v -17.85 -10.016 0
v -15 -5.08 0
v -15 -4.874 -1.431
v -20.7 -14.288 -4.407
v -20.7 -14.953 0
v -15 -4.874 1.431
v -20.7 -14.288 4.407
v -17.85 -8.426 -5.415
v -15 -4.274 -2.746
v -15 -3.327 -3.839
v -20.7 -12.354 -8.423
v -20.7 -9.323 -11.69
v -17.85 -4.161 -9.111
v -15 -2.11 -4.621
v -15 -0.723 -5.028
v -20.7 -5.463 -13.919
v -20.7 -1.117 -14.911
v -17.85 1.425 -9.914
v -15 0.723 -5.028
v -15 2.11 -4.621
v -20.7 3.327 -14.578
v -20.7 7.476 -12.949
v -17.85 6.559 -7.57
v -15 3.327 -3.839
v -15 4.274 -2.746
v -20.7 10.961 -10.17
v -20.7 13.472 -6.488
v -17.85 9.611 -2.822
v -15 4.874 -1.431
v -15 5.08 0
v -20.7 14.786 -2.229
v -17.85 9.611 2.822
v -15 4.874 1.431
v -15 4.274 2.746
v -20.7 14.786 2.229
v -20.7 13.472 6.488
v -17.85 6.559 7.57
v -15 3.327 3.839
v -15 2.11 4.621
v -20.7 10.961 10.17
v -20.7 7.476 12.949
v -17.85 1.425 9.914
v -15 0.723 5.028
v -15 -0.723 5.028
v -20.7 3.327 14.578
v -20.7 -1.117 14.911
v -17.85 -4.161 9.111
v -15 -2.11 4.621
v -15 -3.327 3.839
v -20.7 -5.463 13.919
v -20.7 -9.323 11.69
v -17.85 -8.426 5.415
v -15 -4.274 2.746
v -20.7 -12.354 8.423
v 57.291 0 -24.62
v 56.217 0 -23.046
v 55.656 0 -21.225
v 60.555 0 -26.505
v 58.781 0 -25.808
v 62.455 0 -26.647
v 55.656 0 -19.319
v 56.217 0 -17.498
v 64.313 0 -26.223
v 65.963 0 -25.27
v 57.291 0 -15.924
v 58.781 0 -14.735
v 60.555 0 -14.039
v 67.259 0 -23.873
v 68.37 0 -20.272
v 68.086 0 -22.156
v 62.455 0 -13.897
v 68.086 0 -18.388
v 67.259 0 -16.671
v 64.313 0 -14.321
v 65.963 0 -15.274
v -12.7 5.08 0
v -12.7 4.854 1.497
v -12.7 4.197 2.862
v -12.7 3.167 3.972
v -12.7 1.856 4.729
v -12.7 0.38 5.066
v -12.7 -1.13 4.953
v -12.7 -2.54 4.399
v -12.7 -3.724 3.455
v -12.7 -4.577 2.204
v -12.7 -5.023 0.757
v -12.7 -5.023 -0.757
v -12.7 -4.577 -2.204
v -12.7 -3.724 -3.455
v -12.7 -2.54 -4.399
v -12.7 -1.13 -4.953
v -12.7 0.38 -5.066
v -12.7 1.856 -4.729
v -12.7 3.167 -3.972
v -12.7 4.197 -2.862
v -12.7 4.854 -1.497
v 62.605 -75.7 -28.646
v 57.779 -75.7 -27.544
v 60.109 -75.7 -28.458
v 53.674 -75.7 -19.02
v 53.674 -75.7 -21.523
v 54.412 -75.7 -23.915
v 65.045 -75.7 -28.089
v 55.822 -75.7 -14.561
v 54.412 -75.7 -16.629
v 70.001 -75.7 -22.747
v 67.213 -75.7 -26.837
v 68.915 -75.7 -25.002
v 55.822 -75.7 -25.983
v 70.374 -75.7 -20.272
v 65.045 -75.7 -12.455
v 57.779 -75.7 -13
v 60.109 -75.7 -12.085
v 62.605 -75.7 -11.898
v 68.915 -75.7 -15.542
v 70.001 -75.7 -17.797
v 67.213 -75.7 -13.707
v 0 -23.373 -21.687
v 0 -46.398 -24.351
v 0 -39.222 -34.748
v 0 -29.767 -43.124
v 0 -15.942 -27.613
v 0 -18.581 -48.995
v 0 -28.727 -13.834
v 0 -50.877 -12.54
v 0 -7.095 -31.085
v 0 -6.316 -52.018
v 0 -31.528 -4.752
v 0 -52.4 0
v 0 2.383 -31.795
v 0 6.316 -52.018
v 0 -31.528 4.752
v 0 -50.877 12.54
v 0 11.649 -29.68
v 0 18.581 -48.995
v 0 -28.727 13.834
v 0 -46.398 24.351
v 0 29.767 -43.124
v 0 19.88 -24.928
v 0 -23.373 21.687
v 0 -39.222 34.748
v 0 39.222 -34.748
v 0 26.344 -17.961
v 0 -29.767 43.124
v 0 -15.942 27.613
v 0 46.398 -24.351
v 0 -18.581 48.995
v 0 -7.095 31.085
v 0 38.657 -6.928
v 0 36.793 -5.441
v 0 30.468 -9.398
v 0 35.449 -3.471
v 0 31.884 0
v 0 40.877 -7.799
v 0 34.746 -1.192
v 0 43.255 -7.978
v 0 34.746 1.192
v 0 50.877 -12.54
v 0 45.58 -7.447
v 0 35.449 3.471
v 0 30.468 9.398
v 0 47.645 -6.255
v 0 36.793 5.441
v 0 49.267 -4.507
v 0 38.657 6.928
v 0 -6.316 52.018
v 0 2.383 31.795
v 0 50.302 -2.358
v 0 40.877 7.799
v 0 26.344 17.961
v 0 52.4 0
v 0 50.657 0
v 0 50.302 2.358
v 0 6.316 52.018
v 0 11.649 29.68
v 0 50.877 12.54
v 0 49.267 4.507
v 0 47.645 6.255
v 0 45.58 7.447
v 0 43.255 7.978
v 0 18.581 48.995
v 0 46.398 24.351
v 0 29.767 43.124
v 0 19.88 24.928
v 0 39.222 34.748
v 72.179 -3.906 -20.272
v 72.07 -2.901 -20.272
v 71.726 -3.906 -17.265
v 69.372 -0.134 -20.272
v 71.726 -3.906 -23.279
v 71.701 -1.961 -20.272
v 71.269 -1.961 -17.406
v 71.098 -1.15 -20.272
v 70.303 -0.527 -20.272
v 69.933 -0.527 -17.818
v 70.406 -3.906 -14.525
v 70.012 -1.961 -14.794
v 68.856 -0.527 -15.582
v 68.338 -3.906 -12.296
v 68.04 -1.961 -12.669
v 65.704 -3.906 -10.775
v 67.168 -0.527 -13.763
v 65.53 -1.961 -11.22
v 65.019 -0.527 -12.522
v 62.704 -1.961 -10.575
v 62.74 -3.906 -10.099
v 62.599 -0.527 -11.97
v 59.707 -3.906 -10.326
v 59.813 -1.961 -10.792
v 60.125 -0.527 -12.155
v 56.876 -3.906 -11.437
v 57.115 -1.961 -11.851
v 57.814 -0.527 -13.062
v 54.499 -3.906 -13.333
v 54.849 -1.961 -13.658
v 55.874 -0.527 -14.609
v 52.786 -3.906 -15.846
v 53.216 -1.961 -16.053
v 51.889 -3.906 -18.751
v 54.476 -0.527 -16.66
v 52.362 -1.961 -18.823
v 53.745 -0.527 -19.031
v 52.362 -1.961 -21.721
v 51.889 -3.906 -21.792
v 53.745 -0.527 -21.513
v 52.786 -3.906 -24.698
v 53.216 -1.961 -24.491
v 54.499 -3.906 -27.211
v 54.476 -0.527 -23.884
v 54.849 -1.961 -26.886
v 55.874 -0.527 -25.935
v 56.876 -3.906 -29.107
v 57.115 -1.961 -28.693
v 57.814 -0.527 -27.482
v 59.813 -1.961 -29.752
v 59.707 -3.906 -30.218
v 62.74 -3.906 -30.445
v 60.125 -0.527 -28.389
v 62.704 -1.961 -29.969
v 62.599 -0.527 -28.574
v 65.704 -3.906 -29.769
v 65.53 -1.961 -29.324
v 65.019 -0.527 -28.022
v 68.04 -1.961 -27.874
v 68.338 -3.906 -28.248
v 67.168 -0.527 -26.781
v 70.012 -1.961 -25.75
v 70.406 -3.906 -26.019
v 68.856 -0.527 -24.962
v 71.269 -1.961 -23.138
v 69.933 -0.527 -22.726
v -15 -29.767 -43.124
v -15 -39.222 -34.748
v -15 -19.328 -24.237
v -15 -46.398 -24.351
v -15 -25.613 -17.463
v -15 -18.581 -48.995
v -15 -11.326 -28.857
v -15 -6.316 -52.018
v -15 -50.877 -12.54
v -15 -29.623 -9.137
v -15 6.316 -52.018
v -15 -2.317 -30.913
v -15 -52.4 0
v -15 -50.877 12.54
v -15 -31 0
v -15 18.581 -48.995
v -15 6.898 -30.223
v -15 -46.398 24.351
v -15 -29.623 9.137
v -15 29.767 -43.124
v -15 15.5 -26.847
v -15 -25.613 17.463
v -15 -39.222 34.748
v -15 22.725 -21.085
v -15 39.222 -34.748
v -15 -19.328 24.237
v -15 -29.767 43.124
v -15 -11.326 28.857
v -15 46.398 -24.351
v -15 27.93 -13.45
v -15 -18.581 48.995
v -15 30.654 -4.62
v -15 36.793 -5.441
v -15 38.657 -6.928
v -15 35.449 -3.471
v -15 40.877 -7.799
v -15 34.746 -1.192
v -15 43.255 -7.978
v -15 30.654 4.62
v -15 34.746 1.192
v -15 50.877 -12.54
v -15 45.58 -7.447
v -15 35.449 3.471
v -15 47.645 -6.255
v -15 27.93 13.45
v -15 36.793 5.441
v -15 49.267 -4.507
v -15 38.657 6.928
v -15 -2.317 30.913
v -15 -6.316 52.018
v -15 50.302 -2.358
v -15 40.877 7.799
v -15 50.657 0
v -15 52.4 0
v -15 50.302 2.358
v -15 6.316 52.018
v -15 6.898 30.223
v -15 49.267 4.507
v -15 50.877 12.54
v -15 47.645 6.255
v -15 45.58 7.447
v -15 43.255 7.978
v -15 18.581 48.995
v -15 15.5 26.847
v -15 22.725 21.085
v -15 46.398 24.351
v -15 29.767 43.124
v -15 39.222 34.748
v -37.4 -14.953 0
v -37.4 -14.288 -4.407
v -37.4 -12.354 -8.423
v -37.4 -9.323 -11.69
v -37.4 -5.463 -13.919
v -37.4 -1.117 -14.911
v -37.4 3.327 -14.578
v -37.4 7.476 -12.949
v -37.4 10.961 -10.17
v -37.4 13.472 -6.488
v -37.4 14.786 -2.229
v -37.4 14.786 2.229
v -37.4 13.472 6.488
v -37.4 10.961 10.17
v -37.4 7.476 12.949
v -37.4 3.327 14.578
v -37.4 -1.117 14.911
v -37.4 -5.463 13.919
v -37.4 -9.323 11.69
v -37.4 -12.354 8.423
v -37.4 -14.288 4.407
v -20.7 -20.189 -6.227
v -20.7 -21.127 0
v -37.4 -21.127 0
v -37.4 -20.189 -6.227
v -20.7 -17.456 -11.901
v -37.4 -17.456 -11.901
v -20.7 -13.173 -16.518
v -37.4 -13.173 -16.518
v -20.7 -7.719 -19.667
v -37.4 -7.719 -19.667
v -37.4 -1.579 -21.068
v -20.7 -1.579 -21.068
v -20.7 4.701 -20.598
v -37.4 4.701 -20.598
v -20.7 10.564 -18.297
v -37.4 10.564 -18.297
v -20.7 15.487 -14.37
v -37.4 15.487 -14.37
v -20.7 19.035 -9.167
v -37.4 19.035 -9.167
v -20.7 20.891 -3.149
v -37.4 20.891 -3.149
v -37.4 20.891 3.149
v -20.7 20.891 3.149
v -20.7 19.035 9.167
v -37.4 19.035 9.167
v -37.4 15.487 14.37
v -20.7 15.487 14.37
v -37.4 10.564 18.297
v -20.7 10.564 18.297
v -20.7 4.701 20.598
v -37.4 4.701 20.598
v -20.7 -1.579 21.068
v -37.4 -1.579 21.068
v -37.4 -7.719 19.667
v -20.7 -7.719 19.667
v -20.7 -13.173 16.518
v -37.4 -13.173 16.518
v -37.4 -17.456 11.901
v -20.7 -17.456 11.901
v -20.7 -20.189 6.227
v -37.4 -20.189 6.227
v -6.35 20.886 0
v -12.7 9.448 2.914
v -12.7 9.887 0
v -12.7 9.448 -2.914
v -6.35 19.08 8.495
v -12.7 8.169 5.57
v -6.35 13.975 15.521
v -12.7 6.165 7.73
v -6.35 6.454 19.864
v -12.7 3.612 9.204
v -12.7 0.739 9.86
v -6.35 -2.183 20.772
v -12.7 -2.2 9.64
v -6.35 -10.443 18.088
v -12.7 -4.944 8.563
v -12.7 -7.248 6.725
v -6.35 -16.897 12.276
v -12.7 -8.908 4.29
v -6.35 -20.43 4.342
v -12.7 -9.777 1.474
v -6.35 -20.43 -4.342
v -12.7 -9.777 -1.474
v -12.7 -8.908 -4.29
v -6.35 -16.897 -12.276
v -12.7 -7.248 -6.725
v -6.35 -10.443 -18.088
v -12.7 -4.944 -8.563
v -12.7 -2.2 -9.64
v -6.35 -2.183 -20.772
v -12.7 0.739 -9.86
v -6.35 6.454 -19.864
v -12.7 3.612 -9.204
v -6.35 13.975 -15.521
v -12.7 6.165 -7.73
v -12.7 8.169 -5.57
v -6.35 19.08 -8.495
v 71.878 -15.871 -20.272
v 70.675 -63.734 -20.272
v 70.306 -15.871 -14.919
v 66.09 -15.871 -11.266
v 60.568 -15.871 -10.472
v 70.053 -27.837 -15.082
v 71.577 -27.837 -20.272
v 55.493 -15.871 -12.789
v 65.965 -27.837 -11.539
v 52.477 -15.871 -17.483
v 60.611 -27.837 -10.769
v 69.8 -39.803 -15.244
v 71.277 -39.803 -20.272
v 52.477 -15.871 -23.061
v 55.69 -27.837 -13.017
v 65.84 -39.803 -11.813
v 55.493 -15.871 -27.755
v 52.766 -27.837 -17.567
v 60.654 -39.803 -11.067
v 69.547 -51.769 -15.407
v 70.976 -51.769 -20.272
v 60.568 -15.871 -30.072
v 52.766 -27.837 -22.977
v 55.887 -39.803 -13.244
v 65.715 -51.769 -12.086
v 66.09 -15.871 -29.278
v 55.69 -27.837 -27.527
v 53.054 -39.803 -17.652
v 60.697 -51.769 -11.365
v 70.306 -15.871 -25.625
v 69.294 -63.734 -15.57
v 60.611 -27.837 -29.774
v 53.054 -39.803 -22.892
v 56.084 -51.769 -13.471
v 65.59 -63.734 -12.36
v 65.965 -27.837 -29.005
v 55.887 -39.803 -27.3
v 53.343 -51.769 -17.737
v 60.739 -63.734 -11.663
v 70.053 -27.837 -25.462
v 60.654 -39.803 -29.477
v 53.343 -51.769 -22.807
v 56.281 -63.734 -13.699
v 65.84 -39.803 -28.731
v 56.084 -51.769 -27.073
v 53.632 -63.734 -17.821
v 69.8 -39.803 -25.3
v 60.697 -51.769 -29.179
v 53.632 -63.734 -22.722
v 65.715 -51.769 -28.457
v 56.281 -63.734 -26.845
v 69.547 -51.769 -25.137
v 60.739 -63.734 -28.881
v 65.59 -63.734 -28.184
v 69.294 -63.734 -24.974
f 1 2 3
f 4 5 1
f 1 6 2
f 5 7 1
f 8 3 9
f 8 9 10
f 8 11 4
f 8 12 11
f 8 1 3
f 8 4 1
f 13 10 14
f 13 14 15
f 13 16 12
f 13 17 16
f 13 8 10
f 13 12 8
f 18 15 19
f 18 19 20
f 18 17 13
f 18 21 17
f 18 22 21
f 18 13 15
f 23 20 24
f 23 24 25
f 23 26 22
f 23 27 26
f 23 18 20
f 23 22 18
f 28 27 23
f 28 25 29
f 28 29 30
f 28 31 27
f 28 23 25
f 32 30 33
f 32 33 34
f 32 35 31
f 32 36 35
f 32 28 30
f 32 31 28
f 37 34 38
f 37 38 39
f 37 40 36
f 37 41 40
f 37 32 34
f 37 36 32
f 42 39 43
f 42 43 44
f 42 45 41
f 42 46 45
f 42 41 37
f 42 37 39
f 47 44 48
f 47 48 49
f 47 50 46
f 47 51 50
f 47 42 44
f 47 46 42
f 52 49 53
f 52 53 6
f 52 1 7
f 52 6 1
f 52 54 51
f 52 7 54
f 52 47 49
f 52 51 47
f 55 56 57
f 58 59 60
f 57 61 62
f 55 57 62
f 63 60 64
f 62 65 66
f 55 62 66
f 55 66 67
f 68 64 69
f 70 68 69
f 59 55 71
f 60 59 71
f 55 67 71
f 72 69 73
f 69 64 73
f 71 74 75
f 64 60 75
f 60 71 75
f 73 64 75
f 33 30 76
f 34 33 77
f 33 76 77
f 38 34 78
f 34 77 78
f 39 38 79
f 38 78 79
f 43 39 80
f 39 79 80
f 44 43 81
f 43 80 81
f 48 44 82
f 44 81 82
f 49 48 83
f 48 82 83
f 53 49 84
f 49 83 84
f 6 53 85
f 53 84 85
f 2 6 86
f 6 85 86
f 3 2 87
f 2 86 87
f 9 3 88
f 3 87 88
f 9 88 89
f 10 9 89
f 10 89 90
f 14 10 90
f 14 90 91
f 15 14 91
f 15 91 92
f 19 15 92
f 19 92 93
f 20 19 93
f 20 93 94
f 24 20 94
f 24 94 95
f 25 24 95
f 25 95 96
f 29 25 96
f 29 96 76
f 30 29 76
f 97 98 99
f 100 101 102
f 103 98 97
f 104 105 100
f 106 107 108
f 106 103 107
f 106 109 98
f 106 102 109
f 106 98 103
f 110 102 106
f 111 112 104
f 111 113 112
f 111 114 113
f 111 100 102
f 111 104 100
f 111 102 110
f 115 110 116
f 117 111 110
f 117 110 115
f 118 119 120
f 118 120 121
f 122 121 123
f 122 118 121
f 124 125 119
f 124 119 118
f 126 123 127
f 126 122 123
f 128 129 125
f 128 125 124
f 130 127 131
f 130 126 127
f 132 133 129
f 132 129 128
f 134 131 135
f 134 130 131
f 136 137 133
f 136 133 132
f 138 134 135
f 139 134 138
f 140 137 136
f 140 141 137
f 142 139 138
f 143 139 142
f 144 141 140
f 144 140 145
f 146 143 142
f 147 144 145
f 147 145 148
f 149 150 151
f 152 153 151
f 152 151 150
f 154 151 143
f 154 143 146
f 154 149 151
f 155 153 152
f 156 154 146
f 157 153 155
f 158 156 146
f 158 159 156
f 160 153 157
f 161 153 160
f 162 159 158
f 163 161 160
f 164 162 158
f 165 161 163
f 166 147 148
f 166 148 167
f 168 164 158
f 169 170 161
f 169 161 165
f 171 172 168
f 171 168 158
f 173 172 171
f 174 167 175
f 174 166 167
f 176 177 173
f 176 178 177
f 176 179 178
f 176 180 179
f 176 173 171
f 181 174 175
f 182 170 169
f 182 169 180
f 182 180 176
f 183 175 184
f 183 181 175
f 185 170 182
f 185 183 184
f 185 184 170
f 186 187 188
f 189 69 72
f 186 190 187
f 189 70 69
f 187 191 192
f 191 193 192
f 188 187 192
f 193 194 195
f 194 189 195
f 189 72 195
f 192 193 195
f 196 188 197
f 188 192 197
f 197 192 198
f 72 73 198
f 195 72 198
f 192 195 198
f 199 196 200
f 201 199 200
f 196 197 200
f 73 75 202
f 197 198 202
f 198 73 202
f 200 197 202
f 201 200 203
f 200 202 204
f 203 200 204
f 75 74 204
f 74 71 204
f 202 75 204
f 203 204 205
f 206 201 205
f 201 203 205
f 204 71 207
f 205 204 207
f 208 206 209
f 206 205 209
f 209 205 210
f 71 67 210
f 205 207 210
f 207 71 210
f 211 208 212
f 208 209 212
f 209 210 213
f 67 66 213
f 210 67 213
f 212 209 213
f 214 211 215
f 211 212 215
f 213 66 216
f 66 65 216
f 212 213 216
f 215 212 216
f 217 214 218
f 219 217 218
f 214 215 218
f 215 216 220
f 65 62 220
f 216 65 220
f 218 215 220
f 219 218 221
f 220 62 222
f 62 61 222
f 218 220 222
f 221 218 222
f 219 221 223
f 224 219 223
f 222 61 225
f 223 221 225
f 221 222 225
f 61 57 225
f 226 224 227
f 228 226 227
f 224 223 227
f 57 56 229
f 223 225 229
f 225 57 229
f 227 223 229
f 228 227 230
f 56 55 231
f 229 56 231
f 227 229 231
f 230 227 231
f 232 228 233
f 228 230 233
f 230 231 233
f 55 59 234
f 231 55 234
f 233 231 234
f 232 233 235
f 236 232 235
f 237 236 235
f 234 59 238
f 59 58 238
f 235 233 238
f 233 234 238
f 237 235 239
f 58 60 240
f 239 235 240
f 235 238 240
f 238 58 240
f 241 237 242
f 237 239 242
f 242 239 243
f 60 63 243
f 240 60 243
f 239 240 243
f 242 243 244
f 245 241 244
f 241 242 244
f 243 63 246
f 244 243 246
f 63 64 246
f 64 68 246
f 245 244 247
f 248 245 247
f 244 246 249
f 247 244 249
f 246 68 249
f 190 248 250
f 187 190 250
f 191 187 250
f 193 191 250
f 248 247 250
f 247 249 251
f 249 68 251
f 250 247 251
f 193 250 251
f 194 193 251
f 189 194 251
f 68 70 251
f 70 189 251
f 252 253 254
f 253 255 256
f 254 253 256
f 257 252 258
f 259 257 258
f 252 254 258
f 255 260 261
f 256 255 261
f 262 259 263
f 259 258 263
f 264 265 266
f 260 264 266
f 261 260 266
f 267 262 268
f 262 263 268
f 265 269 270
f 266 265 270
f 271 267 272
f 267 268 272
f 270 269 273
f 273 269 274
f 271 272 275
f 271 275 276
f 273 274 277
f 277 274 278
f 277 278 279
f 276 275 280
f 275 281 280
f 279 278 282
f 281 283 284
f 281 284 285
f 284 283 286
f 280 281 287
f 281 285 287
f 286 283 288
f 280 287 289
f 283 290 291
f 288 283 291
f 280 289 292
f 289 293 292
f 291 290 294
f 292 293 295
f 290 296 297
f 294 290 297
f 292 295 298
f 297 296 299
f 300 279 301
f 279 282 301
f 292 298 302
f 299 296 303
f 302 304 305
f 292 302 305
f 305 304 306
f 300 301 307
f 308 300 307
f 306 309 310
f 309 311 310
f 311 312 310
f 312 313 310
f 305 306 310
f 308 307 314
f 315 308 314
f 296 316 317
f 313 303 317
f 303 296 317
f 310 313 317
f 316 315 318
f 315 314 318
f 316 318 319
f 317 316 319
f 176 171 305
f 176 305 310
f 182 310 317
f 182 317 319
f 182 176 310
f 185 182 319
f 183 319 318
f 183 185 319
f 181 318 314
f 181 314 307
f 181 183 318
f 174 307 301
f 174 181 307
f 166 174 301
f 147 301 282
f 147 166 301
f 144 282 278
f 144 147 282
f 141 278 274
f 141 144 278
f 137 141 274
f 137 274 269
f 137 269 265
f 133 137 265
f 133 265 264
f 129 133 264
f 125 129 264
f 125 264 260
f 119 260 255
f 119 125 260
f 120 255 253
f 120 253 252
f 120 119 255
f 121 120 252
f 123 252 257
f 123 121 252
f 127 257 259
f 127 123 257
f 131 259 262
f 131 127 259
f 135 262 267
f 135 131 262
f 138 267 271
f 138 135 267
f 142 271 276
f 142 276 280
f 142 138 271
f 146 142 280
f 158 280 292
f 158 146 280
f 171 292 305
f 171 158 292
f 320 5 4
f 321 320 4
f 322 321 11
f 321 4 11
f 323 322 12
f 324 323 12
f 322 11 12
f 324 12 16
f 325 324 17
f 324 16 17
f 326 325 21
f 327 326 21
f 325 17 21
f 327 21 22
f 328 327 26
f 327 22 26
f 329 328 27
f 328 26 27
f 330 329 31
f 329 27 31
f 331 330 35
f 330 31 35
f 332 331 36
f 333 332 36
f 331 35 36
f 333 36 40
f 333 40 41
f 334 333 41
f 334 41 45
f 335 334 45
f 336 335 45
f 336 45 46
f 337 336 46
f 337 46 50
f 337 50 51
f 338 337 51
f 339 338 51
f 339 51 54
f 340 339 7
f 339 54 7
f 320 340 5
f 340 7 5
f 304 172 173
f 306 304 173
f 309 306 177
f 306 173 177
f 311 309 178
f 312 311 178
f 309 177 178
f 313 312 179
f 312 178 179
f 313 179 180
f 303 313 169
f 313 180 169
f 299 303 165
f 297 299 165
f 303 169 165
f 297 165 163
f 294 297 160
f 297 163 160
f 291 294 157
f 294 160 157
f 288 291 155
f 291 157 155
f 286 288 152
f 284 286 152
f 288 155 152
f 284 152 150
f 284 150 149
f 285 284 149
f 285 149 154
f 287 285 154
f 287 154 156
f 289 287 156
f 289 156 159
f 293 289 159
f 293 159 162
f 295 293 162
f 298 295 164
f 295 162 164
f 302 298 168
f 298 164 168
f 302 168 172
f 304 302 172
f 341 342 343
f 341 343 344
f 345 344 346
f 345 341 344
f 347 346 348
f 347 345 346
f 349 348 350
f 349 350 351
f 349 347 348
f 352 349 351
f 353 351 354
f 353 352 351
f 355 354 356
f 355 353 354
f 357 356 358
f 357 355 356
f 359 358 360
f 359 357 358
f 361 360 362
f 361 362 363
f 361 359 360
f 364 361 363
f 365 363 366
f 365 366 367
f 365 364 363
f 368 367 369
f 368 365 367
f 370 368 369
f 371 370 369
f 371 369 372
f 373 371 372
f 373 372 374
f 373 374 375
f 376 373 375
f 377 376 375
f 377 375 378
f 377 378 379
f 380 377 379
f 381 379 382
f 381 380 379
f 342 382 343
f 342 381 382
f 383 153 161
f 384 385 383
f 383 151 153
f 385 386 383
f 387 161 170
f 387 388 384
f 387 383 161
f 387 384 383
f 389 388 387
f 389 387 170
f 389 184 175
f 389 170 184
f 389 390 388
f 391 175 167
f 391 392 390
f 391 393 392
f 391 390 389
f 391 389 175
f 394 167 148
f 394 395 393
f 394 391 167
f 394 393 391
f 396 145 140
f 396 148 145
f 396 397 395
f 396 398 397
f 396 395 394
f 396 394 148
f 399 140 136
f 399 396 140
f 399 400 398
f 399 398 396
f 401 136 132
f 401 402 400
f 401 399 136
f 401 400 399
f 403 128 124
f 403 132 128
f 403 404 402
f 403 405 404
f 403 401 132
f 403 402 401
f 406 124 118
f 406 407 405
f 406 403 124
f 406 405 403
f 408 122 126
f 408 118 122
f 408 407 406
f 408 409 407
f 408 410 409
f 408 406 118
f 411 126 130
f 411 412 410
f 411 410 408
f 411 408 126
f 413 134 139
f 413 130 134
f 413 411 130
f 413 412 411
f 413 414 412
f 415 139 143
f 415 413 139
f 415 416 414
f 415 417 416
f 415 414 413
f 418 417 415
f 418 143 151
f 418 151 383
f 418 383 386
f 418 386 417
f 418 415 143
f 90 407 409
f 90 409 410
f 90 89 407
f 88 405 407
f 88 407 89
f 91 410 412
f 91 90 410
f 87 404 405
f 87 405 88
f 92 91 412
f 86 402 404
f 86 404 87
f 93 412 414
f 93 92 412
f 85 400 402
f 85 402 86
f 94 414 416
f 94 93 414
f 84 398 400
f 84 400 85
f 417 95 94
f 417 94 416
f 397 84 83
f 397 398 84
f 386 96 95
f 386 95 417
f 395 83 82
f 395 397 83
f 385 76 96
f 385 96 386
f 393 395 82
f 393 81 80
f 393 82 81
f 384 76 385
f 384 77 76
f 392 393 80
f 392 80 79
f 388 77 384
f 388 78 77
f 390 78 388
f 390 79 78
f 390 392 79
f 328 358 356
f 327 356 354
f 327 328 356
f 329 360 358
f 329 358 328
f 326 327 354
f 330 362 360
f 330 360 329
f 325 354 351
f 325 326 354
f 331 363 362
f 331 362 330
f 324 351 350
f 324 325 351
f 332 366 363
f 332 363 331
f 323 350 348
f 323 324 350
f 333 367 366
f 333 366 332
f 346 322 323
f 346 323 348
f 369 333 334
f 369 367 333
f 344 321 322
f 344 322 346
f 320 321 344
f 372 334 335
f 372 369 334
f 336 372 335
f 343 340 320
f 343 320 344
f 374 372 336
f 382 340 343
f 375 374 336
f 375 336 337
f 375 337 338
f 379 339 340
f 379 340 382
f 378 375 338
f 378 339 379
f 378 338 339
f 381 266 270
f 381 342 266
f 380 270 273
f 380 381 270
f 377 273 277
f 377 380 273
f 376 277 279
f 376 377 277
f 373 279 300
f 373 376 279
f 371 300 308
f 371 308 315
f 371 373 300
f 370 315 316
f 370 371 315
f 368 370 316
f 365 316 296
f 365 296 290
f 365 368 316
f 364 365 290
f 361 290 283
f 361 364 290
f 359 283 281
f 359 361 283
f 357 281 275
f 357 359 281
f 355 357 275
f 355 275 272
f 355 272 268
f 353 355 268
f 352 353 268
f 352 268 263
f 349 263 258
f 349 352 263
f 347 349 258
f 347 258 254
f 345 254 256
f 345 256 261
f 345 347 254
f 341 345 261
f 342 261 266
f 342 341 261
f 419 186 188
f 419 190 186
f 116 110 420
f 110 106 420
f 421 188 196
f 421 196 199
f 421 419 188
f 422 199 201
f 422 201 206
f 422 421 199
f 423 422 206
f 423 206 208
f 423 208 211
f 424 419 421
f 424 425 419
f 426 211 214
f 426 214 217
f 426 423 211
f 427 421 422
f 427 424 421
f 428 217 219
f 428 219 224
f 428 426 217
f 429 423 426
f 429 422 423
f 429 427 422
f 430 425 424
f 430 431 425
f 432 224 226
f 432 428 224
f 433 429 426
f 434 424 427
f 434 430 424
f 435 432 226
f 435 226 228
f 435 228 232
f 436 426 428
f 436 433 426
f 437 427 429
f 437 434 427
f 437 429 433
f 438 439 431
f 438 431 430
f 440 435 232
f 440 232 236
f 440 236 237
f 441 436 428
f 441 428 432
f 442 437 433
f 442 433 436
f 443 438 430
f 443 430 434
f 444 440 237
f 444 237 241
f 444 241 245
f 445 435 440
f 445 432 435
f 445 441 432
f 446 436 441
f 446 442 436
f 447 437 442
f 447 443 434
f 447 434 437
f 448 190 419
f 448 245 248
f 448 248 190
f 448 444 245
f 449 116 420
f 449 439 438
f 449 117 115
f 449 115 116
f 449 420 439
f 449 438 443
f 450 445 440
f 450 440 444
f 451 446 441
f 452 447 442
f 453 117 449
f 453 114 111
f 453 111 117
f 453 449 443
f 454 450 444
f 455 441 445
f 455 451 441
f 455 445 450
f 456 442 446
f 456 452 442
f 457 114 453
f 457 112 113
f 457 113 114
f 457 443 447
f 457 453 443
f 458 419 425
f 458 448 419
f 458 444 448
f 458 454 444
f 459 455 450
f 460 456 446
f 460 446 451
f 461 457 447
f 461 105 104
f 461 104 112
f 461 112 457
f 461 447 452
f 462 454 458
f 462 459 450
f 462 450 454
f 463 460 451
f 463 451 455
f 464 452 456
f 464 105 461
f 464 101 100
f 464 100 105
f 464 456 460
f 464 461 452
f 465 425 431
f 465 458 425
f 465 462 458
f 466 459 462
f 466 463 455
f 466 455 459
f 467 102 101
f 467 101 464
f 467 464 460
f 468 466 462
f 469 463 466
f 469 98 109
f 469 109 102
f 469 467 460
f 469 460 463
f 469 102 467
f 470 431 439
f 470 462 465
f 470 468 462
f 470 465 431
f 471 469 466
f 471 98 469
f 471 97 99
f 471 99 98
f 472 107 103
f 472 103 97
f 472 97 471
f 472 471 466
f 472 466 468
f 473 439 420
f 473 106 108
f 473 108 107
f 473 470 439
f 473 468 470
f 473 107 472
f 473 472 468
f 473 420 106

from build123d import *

# Parameters (mm, degrees)
F0_R      = 52.4
F0_R_2    = 31.8270432581
F0_R_3    = 8
F1_DEPTH  = 15
F2_R      = 31.8844804613
F3_DEPTH  = 12.7
F3_TAPER  = 60
F4_R      = 5.08
F5_DEPTH  = 2.301
F6_R      = 31
F6_R_2    = 5.08
F7_DEPTH  = 5.7
F7_TAPER  = 60
F8_DEPTH  = 16.7
F9_R      = 10.3
F10_DEPTH = 75.7
F10_TAPER = 1.44
F11_R     = 3.81


with BuildPart() as f1:
    # F0 (on Right) → F1 (new body)
    with BuildSketch(Plane.YZ):
        Circle(F0_R)
        Circle(F0_R_2, mode=Mode.SUBTRACT)
        with Locations((42.6571465449, 0)):
            Circle(F0_R_3, mode=Mode.SUBTRACT)
        Circle(F0_R_2)
    extrude(amount=-F1_DEPTH)

    # F2 (on face) → F3 (cut)
    with BuildSketch(Plane.YZ):
        Circle(F2_R)
    extrude(amount=-F3_DEPTH, taper=F3_TAPER, mode=Mode.SUBTRACT)

    # F4 (on face) → F5 (cut, through all)
    with BuildSketch(Plane.YZ.offset(-12.7)):
        Circle(F4_R)
    extrude(amount=-F5_DEPTH, mode=Mode.SUBTRACT)

    # F6 (on face) → F7 (join)
    with BuildSketch(Plane(origin=(-15, 0, 0), x_dir=(0, -1, 0), z_dir=(-1, 0, 0))):
        Circle(F6_R)
        Circle(F6_R_2, mode=Mode.SUBTRACT)
    extrude(amount=F7_DEPTH, taper=F7_TAPER)

    # F8 (add): a face of the model
    f8_faces = [f1.faces().sort_by_distance(p)[0] for p in [
        (-20.7, 20.5297398189, 0),
    ]]
    extrude(f8_faces, amount=F8_DEPTH)


with BuildPart() as f10:
    # F9 (on Front) → F10 (new body)
    with BuildSketch(Plane.XZ):
        with Locations((61.9771853089, -20.2719457448)):
            Circle(F9_R)
    extrude(amount=F10_DEPTH, taper=F10_TAPER)

    # F11
    f11_edges = [f10.edges().sort_by_distance(p)[0] for p in [
        (51.677185, 0, -20.271946),
    ]]
    fillet(f11_edges, radius=F11_R)


solid = Compound([f1.part, f10.part])
